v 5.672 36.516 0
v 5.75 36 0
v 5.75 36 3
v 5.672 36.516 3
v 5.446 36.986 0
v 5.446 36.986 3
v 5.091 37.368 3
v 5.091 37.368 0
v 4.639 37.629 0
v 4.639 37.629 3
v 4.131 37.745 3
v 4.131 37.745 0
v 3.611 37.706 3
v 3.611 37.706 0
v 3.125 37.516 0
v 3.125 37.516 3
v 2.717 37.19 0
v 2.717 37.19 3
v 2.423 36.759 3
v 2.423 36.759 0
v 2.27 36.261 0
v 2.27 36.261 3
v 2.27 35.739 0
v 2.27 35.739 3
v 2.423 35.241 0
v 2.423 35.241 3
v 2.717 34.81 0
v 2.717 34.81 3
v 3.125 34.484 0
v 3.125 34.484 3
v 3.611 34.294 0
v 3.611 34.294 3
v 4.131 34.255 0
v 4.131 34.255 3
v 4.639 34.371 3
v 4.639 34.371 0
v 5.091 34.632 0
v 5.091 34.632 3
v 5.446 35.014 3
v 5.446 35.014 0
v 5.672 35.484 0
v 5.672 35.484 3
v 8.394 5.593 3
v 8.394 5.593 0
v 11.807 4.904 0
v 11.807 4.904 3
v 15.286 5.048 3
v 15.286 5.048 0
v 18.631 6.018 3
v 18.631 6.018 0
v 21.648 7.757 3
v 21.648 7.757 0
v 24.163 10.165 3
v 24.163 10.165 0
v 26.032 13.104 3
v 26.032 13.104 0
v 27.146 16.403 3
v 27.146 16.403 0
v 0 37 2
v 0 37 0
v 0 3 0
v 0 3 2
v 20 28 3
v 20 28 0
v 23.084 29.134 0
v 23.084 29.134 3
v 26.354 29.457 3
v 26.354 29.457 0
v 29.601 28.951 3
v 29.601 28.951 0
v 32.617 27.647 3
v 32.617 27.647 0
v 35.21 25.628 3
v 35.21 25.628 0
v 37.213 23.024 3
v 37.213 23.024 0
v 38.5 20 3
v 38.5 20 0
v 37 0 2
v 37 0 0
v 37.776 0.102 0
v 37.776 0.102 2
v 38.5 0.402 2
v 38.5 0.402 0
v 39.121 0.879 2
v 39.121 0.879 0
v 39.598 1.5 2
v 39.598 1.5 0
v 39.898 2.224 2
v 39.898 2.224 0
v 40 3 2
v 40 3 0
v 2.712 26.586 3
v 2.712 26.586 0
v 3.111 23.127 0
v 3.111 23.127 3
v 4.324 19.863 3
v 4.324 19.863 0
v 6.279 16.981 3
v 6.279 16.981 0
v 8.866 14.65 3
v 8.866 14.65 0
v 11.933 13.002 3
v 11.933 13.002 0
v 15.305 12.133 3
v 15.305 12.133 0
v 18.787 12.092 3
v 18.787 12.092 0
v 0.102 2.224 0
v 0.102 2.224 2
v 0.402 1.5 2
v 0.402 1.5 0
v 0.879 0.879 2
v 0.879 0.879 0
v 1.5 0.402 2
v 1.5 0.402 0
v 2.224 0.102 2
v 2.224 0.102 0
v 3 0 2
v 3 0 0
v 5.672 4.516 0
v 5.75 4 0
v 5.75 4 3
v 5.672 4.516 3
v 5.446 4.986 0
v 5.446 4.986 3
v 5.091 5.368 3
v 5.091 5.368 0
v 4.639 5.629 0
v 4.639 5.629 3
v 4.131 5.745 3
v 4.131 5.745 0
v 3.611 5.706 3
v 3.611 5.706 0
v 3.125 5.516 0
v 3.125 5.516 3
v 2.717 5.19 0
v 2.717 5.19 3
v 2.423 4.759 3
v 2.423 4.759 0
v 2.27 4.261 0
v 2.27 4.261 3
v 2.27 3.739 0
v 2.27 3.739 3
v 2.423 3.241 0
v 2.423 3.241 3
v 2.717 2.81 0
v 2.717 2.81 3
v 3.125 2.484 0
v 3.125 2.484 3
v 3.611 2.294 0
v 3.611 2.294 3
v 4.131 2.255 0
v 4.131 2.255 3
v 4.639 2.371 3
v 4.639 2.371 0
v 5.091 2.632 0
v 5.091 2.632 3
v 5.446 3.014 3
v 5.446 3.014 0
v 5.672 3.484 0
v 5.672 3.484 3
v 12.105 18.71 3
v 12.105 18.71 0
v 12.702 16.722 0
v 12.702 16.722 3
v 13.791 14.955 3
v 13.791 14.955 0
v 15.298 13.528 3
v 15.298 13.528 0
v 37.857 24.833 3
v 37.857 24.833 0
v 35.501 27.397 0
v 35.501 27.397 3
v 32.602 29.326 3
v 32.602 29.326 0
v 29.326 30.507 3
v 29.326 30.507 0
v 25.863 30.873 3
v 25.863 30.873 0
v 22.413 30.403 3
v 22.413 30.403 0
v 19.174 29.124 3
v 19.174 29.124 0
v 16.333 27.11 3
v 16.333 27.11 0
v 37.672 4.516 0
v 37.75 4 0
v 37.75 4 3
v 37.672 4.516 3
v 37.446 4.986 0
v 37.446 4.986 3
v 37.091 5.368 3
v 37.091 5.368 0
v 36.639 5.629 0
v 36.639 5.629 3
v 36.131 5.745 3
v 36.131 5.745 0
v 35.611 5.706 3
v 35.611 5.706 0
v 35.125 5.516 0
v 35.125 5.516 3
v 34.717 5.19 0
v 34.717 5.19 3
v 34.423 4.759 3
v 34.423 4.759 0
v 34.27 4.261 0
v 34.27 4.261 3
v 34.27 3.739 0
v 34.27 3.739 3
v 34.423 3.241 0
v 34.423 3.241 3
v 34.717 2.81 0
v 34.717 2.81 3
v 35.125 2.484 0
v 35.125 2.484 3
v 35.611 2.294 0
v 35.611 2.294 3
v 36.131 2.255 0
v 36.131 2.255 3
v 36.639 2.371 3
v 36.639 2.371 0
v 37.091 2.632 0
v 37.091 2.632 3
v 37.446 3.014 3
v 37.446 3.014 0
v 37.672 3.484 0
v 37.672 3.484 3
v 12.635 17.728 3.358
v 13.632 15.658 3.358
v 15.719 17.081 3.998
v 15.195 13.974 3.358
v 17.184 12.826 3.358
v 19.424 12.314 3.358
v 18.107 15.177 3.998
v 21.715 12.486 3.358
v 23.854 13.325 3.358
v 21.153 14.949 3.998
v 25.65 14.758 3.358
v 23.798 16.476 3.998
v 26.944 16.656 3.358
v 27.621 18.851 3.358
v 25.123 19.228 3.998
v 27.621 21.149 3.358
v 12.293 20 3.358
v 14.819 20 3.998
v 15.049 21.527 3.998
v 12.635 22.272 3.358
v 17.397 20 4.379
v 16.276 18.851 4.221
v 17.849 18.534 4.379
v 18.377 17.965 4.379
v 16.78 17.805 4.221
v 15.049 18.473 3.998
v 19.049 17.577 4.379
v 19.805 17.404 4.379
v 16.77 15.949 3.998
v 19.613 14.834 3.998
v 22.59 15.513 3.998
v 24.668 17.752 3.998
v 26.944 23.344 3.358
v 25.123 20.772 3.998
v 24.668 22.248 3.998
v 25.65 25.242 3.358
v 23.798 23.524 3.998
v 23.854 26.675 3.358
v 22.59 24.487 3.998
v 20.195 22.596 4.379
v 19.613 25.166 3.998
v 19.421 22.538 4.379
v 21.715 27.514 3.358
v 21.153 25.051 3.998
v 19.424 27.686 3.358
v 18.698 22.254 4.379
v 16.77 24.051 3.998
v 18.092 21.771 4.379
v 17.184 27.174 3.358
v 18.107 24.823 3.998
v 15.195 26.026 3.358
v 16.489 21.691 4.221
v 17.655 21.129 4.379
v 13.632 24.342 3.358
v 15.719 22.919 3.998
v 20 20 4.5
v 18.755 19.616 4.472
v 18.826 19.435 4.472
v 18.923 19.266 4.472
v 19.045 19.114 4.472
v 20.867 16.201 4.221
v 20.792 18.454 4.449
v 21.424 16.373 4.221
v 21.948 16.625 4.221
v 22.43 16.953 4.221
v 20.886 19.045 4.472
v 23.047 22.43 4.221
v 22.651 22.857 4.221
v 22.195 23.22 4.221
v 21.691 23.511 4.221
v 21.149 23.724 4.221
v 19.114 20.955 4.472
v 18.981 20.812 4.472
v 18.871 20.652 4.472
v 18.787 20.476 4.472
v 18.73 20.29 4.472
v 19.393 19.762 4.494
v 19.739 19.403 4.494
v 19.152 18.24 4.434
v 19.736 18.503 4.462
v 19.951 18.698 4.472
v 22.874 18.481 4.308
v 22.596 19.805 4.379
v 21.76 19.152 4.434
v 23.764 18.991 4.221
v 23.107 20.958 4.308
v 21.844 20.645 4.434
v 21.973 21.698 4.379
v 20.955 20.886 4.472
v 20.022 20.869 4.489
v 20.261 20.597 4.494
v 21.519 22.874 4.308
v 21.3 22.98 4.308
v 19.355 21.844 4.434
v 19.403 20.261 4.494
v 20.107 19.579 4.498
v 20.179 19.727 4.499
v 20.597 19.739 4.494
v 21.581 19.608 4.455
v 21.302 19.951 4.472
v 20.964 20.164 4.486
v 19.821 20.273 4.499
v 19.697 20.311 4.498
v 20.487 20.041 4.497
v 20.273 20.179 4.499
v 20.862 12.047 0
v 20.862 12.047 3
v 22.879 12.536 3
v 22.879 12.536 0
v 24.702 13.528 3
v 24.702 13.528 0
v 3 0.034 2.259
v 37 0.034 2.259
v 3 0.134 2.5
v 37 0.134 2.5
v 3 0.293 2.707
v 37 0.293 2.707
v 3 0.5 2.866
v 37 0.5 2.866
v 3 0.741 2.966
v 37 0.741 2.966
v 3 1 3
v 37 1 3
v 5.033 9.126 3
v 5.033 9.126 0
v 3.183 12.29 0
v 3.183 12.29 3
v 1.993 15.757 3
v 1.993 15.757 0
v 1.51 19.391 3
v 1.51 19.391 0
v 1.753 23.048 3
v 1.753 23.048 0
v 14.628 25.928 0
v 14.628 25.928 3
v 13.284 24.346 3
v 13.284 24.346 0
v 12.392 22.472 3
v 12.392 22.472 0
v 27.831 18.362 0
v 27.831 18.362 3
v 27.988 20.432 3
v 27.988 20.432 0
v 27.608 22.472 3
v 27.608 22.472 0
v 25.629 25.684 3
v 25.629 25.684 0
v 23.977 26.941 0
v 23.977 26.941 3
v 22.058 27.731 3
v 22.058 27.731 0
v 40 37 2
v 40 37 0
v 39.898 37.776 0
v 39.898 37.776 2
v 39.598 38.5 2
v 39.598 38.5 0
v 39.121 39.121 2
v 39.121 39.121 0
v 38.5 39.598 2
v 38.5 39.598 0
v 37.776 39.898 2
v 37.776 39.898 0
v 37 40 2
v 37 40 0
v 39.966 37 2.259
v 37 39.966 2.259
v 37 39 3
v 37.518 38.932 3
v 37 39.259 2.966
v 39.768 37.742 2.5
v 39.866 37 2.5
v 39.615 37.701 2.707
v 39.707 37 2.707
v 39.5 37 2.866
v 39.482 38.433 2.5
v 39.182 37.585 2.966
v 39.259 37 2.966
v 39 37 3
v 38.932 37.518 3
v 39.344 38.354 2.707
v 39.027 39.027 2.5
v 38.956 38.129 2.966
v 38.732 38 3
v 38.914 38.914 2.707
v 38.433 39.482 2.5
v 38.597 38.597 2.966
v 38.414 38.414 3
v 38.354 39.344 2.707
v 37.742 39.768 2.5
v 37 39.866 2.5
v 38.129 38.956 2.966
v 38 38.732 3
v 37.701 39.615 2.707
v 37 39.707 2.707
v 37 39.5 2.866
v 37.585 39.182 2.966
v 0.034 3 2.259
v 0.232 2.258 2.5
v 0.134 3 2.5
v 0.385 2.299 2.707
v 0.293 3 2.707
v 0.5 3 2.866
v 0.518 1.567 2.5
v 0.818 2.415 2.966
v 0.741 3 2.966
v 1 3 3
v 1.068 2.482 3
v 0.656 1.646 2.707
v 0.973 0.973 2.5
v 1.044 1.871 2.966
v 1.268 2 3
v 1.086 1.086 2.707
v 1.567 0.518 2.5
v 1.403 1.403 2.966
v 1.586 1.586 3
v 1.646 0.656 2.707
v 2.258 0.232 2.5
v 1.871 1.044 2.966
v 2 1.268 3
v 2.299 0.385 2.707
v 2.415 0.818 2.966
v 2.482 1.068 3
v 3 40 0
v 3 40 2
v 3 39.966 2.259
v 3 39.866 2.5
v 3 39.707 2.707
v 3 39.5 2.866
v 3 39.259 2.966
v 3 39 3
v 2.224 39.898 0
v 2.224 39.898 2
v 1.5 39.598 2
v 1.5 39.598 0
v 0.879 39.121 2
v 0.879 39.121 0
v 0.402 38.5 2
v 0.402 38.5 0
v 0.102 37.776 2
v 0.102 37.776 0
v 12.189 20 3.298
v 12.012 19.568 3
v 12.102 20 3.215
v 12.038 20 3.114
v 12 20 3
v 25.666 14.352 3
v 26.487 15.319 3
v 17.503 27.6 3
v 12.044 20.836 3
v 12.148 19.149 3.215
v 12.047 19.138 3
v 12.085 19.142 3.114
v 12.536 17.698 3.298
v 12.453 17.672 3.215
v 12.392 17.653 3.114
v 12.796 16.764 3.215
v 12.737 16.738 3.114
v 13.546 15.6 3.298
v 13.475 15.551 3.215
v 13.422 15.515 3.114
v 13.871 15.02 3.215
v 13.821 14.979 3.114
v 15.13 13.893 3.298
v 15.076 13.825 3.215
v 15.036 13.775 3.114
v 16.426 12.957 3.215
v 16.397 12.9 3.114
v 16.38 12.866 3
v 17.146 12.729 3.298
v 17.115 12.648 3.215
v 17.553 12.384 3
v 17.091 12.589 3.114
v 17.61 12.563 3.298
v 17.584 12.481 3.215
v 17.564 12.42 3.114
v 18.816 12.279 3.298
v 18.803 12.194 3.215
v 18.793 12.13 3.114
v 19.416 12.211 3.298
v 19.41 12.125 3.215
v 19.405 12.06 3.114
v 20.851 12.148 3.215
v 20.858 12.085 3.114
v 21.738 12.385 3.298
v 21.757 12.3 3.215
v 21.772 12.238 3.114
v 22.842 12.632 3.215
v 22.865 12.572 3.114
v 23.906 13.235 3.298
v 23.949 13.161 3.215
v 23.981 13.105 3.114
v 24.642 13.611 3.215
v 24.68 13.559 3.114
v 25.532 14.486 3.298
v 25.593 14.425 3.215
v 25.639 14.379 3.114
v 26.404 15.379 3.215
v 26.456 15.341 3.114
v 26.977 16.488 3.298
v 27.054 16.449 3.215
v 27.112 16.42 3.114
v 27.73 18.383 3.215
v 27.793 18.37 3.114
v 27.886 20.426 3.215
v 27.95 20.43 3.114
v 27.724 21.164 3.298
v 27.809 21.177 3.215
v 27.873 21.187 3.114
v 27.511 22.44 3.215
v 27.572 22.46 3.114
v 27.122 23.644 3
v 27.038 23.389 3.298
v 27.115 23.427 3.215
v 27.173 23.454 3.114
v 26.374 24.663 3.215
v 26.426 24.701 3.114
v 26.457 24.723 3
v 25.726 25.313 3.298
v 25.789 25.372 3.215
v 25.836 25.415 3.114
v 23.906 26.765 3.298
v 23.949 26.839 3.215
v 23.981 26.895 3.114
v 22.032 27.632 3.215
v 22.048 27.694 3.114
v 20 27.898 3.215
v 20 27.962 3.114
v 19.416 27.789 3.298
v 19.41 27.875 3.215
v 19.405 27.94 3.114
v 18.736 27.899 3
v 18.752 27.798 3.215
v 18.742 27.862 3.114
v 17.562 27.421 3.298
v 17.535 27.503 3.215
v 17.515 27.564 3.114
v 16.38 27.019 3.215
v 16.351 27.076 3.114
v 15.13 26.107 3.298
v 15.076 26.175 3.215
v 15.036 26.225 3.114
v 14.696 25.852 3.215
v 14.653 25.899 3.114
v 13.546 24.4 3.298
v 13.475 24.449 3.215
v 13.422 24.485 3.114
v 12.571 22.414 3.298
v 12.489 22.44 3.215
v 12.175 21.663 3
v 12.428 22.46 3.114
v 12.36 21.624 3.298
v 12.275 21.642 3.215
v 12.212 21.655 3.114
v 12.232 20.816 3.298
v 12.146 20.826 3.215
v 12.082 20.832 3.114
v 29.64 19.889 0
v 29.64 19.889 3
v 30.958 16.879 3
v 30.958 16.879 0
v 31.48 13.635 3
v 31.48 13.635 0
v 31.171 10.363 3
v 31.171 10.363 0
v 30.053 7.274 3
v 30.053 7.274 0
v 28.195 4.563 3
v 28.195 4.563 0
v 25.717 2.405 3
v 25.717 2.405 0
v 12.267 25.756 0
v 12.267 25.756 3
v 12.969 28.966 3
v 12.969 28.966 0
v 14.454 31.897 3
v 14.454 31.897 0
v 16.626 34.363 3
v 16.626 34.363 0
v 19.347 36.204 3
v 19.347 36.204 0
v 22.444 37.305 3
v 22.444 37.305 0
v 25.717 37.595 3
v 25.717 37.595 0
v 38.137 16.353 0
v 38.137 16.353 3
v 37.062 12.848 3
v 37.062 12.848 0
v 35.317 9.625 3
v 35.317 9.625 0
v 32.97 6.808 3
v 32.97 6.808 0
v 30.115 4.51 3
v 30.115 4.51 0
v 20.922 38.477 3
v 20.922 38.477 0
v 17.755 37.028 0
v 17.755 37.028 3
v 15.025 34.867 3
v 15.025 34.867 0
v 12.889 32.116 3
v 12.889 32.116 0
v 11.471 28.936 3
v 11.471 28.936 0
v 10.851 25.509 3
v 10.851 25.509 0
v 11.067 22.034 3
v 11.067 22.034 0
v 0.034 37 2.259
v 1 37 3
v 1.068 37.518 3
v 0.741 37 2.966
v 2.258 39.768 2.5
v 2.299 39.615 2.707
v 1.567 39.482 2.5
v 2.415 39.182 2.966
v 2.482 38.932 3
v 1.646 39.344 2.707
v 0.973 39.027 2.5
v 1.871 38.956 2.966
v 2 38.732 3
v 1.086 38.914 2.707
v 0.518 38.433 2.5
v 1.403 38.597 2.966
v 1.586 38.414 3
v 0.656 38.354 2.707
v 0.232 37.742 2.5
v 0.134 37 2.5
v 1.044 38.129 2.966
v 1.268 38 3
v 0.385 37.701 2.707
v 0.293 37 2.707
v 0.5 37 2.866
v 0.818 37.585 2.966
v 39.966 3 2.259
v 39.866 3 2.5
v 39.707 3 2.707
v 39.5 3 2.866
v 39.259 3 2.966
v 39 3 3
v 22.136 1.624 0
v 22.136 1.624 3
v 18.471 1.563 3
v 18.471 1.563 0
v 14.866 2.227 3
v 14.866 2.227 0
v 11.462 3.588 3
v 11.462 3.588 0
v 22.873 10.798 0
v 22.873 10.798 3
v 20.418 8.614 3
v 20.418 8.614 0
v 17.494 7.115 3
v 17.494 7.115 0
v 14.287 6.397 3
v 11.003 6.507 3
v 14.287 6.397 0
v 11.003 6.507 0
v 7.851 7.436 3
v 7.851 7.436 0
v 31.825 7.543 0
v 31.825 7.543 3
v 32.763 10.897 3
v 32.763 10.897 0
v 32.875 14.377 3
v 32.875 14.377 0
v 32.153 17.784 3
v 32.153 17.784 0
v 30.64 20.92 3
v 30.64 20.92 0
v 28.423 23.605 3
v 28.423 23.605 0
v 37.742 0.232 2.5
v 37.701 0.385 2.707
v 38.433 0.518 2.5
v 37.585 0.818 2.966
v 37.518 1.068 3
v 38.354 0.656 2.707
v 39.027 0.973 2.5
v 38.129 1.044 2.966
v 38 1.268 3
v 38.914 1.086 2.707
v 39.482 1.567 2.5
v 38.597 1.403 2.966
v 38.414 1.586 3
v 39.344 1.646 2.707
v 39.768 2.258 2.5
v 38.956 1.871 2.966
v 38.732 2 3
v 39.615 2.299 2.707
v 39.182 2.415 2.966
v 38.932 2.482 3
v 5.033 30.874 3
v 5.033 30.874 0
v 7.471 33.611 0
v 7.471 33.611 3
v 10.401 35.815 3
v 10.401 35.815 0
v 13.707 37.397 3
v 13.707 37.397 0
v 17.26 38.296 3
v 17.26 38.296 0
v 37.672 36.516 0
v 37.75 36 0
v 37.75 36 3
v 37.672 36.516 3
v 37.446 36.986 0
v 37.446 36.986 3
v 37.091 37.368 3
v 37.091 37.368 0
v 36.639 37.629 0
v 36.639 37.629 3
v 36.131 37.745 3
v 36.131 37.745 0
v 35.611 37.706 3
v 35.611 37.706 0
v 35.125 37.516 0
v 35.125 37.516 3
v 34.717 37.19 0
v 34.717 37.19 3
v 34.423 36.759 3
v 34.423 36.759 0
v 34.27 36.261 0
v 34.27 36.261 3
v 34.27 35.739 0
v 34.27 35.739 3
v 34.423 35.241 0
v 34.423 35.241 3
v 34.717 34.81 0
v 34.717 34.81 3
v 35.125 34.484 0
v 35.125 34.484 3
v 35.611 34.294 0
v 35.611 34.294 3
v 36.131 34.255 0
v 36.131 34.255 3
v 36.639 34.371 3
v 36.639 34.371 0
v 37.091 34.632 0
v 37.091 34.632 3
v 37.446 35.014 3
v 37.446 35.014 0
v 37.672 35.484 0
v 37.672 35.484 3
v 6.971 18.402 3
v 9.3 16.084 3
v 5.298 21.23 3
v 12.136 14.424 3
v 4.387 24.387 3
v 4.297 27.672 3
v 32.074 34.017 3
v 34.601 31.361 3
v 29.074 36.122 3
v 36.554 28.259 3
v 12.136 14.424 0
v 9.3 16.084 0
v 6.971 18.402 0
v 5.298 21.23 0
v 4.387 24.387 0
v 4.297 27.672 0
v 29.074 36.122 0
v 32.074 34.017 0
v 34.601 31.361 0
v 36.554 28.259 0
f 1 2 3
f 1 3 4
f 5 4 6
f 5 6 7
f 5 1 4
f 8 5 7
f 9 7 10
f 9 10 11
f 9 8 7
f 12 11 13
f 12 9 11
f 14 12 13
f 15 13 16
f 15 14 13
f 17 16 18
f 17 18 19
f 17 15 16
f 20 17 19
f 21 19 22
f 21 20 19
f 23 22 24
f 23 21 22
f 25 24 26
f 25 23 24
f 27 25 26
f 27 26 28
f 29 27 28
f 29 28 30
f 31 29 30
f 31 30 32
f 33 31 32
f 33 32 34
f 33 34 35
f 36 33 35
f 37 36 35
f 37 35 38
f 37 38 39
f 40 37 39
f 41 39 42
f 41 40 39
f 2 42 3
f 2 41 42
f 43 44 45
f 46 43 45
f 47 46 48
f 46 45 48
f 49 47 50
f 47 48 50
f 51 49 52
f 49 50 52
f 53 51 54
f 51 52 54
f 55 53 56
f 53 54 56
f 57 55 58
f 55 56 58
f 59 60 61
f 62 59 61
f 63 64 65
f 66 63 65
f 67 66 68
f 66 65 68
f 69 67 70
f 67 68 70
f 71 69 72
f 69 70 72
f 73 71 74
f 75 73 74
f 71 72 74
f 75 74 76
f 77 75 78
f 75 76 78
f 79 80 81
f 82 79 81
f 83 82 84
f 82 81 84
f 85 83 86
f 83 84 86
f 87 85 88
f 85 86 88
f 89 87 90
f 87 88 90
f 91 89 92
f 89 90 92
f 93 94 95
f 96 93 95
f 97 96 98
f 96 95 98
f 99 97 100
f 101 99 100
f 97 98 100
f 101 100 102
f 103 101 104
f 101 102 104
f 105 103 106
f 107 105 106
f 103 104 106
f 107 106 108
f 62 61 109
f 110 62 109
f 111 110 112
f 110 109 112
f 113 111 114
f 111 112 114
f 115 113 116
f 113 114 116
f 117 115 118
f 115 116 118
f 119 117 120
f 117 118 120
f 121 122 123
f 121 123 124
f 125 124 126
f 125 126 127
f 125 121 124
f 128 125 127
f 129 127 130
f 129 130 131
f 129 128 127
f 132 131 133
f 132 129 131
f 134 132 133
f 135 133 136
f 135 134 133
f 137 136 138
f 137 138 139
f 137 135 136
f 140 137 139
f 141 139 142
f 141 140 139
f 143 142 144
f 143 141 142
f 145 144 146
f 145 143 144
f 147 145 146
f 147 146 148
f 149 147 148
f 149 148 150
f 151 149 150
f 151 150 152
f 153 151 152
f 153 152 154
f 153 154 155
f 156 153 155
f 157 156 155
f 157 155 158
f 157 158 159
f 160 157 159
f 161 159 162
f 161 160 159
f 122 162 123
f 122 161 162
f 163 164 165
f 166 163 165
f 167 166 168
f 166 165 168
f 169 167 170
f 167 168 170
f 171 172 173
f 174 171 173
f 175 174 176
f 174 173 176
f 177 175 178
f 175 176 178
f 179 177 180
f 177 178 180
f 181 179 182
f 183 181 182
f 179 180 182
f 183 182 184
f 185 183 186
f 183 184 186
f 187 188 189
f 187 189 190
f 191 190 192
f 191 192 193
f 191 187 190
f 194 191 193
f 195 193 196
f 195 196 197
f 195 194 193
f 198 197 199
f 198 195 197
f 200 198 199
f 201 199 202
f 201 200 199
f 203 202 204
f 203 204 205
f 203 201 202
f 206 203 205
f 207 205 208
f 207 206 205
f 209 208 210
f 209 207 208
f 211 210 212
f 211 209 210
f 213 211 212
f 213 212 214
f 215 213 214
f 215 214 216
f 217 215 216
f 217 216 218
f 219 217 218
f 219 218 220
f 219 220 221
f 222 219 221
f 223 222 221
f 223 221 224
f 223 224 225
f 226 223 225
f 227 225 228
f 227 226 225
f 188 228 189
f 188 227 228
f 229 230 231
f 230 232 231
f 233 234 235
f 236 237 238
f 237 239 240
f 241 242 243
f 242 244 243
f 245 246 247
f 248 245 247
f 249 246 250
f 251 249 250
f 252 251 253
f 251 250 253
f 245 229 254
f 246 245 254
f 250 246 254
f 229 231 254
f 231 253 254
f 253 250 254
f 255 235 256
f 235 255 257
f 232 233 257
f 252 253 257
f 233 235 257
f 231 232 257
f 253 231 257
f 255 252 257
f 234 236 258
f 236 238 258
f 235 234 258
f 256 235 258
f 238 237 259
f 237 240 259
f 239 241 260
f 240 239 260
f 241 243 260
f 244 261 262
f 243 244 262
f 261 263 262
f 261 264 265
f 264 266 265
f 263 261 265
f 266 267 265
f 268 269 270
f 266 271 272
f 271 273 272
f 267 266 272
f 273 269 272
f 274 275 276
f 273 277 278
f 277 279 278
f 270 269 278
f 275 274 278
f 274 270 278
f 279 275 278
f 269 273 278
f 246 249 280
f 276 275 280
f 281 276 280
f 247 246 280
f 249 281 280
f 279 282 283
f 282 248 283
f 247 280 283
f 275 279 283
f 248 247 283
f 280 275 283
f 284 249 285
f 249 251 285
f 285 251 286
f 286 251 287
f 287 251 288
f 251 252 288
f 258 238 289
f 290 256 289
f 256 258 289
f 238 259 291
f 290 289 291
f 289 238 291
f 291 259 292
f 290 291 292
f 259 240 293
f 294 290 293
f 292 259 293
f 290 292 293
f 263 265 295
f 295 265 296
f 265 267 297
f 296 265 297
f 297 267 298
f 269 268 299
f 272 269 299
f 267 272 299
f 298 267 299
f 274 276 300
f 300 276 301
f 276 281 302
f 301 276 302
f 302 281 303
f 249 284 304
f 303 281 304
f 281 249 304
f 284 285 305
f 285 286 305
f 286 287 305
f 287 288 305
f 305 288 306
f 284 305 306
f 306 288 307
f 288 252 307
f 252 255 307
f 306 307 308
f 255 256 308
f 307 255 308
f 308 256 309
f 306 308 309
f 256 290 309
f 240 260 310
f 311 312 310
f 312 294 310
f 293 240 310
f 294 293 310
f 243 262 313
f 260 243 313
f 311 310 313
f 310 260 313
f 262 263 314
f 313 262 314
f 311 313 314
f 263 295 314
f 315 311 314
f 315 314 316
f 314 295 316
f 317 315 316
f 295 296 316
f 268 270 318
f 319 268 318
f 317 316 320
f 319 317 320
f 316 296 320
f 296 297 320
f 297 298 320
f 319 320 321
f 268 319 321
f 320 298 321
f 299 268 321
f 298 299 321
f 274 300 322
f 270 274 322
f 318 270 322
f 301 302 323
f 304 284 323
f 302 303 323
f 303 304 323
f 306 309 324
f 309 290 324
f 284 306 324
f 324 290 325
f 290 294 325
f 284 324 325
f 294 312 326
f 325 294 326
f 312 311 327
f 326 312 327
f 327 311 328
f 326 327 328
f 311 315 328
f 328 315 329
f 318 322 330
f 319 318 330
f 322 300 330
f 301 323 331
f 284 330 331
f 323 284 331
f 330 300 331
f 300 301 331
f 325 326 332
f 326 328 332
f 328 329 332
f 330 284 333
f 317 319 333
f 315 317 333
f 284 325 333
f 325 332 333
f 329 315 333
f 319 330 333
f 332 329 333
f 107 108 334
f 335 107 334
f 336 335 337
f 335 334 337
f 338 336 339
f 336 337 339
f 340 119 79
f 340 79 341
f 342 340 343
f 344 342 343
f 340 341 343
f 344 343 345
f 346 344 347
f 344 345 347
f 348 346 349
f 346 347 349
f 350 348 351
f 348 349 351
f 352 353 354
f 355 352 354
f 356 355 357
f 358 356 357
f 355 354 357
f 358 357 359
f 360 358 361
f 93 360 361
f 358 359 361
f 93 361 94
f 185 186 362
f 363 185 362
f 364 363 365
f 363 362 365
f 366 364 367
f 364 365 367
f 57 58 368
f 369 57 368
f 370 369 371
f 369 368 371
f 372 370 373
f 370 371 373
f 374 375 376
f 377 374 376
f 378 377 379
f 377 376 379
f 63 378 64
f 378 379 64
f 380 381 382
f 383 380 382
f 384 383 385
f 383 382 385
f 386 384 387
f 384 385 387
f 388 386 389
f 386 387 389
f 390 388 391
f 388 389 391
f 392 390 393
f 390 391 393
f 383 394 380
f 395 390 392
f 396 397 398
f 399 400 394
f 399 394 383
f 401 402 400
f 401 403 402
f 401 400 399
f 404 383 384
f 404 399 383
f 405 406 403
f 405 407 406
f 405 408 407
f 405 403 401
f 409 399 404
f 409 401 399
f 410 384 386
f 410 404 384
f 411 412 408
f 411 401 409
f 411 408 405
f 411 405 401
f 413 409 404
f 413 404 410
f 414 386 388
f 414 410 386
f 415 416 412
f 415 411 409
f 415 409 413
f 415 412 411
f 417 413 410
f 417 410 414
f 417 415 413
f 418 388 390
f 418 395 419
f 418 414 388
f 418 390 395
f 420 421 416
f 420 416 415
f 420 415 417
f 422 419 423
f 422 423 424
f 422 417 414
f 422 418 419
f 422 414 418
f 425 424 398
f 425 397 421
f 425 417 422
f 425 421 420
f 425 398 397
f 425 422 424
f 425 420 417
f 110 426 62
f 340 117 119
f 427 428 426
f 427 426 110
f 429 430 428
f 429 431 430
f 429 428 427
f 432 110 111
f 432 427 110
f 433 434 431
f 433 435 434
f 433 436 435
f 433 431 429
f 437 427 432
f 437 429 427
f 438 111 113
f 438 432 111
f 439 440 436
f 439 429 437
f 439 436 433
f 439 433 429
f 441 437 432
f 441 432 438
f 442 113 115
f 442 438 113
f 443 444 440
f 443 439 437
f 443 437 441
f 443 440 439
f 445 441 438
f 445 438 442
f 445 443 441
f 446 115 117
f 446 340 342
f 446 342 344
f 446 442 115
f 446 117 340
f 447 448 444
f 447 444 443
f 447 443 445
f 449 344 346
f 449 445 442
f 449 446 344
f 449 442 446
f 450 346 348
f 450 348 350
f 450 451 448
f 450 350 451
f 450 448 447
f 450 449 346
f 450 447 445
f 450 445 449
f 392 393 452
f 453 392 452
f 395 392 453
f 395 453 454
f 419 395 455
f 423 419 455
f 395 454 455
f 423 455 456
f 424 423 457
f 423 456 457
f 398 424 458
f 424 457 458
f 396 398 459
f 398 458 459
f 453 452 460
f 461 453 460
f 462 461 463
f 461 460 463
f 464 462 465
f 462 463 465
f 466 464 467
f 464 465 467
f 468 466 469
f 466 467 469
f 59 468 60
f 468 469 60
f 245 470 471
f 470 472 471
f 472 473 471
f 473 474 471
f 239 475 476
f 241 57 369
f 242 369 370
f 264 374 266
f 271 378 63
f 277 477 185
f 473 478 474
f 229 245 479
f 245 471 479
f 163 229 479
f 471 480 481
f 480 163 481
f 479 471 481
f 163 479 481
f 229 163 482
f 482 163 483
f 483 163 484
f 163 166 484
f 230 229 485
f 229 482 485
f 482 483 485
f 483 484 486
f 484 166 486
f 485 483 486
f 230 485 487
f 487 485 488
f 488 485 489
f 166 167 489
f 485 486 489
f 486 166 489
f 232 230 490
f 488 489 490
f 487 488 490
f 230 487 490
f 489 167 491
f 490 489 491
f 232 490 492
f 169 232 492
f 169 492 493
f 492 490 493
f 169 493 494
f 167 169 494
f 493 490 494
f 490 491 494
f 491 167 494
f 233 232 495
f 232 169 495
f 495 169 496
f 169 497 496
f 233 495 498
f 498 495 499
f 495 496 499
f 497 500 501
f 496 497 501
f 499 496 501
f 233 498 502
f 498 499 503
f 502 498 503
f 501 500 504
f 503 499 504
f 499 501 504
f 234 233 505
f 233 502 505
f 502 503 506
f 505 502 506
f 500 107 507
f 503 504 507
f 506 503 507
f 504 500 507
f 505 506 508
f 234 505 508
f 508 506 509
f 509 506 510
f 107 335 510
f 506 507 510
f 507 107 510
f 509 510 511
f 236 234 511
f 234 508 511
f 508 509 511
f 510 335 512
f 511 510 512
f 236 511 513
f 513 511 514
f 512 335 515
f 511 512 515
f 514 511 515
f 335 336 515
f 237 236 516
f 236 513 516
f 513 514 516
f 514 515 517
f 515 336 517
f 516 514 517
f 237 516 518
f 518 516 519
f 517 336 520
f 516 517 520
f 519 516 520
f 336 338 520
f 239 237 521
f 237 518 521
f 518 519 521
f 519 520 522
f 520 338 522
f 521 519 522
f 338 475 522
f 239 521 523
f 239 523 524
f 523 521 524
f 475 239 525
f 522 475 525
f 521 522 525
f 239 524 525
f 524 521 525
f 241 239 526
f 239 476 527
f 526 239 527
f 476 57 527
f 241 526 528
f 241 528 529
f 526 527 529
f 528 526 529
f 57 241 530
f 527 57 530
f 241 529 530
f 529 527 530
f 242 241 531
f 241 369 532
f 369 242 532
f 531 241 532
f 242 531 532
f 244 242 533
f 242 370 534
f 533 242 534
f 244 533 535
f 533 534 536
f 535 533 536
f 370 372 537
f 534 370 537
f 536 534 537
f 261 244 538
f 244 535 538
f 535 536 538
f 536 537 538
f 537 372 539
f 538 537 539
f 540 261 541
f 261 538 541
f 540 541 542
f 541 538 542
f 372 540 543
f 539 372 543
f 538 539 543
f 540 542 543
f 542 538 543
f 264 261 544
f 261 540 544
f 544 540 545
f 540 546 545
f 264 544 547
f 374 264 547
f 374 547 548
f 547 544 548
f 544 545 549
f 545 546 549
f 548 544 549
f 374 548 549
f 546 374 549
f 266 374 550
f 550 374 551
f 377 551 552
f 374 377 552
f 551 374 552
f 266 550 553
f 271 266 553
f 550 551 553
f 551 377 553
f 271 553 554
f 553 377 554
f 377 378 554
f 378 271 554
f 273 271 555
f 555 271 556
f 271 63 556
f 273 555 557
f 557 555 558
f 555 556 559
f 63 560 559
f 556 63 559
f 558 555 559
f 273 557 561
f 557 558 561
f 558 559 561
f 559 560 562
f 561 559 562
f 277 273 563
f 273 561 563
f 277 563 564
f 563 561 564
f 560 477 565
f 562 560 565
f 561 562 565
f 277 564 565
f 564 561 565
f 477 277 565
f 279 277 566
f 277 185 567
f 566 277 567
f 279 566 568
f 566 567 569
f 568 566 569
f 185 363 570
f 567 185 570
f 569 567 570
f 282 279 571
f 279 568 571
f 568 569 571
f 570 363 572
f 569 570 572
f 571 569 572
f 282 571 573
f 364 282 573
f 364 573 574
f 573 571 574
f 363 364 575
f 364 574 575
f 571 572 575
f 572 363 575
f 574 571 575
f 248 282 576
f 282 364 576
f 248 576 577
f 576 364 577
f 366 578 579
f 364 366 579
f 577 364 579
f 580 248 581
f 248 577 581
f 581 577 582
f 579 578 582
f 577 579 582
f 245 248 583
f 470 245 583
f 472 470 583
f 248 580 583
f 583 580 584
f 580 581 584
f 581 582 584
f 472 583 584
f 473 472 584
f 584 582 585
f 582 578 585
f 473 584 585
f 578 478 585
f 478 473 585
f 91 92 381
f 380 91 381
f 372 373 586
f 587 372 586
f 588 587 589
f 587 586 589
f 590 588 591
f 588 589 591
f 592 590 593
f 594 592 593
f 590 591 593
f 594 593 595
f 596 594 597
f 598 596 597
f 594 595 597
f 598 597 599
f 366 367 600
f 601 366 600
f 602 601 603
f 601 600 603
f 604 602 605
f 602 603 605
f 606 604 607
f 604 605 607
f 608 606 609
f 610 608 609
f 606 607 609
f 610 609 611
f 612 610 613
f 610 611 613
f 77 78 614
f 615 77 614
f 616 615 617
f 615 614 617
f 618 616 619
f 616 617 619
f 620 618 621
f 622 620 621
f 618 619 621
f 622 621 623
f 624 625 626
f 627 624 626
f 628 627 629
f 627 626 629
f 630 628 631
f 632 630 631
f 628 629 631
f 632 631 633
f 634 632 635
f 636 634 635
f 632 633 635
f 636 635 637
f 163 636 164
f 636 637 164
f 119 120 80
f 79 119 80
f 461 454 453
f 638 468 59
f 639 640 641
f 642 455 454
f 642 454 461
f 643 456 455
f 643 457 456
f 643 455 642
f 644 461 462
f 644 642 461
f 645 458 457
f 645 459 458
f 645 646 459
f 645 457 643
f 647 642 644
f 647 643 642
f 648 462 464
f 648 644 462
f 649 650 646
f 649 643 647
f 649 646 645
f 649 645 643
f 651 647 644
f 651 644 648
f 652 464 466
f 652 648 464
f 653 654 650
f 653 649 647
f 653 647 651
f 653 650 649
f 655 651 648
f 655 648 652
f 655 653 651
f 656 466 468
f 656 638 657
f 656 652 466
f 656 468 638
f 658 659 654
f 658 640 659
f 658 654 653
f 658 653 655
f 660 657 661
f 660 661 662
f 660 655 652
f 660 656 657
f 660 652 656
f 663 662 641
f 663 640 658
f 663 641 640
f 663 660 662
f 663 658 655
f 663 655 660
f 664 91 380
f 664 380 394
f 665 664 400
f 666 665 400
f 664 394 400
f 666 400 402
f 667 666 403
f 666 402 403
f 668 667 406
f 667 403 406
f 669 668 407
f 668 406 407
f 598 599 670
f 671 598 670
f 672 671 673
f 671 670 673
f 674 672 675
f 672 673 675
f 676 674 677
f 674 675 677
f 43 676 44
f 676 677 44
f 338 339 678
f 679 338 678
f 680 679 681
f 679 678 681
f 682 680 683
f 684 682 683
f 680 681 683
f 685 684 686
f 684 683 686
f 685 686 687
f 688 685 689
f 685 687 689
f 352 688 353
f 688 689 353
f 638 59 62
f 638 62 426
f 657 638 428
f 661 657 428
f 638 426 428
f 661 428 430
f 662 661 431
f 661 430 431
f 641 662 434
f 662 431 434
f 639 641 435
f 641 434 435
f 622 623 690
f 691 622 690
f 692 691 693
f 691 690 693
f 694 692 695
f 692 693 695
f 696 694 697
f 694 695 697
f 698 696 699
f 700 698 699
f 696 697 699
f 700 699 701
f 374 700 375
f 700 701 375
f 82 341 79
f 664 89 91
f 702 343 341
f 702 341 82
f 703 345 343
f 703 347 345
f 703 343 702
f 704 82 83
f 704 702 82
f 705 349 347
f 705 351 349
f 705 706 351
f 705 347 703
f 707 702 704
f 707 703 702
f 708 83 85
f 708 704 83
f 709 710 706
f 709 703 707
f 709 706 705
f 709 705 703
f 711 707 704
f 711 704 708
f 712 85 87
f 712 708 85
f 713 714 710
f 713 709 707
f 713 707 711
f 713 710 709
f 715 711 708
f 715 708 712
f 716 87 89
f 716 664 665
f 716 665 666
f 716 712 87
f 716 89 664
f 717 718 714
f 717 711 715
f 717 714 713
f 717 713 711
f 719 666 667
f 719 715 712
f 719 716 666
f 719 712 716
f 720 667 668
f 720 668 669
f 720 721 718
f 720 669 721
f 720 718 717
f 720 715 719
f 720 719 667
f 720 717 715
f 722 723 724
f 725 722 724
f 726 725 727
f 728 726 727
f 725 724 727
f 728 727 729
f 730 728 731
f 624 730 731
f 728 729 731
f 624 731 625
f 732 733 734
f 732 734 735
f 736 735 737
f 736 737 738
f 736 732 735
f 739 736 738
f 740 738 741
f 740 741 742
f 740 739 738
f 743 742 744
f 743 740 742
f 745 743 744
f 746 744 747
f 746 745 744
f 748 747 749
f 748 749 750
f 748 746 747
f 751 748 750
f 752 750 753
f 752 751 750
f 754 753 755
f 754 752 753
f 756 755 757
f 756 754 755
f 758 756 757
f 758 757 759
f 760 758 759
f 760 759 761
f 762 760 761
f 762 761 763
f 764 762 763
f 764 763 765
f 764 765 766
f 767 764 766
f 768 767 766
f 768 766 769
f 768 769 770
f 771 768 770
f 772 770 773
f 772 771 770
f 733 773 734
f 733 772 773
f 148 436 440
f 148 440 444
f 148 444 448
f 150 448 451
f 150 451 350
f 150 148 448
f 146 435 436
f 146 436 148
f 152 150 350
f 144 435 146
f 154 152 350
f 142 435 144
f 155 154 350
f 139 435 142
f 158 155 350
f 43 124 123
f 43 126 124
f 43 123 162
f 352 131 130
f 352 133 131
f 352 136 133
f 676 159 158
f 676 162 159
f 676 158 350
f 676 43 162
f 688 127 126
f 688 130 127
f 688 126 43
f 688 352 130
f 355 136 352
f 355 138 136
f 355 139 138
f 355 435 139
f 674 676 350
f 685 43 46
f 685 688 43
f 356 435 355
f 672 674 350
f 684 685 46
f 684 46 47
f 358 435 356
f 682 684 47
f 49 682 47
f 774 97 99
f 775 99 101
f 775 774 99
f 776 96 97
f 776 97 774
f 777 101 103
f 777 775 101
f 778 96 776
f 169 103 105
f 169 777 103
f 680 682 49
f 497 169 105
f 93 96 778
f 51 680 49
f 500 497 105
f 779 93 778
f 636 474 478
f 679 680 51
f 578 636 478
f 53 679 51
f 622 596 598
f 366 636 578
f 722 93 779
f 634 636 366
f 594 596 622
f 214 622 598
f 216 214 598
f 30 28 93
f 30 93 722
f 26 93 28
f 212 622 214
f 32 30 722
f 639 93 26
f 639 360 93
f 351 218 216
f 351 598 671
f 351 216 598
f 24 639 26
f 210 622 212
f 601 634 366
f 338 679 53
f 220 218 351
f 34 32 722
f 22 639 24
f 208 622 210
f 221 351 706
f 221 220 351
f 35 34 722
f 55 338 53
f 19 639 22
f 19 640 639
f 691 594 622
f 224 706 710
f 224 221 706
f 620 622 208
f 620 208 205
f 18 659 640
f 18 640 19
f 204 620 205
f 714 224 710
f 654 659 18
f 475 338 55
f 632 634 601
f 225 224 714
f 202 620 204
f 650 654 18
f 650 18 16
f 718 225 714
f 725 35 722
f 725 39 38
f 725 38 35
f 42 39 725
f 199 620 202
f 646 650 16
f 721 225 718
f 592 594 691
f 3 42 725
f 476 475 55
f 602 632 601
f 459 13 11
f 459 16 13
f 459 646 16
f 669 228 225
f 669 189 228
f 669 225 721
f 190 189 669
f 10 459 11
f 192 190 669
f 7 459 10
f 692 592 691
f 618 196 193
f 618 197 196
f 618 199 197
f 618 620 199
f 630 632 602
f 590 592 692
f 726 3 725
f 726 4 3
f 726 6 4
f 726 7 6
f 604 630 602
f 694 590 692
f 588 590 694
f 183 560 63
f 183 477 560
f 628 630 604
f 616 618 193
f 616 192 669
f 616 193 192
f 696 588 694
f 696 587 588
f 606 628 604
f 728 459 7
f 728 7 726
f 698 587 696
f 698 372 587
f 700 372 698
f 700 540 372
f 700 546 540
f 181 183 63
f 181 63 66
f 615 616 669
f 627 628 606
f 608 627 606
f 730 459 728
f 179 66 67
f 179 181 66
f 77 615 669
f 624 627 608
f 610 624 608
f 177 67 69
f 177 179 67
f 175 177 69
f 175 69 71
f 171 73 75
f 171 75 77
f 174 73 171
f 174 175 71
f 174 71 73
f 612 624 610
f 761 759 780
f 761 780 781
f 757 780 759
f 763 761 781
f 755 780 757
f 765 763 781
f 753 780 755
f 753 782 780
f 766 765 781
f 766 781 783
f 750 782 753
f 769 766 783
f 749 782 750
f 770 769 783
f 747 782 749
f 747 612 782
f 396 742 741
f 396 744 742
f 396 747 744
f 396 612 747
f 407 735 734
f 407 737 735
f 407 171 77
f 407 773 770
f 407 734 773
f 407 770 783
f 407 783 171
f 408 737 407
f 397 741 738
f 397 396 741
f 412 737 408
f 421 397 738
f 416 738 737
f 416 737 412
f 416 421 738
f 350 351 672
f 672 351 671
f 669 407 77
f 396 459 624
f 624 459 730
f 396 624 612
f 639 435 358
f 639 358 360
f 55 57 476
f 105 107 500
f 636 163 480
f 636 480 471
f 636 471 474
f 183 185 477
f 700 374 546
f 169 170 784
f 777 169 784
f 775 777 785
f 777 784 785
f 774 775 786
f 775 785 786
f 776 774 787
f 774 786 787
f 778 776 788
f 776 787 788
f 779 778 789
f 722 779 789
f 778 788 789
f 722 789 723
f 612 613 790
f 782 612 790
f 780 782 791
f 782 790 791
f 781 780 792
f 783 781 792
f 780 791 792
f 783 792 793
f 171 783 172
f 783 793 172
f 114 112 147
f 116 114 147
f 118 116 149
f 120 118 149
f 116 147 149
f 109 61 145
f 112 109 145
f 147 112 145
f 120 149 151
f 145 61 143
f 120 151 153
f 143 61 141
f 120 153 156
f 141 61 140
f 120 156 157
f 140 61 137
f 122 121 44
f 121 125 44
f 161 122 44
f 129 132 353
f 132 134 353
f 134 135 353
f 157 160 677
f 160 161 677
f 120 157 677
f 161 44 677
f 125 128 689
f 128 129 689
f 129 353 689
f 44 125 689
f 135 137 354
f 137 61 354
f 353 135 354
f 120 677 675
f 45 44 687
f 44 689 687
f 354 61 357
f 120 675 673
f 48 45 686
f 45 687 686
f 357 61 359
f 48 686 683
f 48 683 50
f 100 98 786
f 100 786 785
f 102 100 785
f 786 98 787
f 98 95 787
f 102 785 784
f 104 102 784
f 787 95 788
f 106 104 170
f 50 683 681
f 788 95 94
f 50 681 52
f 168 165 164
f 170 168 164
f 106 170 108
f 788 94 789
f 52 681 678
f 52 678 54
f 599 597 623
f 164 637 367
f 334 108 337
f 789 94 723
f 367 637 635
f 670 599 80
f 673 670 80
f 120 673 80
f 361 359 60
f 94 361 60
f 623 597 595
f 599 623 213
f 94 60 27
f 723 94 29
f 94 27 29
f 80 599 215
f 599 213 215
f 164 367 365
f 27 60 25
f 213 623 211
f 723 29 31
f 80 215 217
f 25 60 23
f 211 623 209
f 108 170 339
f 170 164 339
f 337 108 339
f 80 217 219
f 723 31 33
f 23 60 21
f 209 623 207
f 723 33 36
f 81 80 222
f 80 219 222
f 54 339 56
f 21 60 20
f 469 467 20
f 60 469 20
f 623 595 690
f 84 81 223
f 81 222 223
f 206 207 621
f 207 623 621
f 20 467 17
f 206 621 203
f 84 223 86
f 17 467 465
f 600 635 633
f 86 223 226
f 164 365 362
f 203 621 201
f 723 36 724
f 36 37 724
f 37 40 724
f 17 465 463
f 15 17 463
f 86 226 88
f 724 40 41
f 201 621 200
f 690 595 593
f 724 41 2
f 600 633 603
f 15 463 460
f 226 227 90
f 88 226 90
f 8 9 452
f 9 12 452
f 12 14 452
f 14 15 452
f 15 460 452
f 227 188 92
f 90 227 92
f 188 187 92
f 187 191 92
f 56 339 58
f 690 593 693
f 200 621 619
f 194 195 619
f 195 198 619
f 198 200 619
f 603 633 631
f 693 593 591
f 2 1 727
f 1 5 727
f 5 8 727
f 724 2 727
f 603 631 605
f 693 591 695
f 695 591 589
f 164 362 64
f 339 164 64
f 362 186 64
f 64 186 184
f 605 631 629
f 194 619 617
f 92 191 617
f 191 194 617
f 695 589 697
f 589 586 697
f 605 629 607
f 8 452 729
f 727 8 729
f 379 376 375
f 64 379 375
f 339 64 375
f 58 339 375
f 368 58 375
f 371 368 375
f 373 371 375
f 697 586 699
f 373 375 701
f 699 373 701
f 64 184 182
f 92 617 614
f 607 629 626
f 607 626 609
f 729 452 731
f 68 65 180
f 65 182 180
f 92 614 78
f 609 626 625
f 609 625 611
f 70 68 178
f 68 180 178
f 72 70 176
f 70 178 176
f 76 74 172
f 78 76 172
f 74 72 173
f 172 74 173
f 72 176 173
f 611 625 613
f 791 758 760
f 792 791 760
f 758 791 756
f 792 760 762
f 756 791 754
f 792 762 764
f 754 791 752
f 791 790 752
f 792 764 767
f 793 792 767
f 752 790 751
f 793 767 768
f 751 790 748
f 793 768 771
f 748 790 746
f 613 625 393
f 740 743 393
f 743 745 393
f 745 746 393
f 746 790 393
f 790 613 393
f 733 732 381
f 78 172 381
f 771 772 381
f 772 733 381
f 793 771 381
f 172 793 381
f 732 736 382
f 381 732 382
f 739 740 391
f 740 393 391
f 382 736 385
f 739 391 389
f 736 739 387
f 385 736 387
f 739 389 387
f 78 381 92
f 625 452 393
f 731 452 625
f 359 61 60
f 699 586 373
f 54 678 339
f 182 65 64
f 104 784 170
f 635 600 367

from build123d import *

# Parameters (mm, degrees)
F0_R     = 1.75
F1_DEPTH = 3
F2_R     = 1


with BuildPart() as f1:
    # F0 (on Top) → F1 (new body)
    with BuildSketch(Plane.XY):
        with BuildLine():
            ThreePointArc((0, 3), (0.8786796564, 0.8786796564), (3, 0))
            Line((3, 0), (37, 0))
            ThreePointArc((37, 0), (39.1213203436, 0.8786796564), (40, 3))
            Line((40, 3), (40, 37))
            ThreePointArc((40, 37), (39.1213203436, 39.1213203436), (37, 40))
            Line((37, 40), (3, 40))
            ThreePointArc((3, 40), (0.8786796564, 39.1213203436), (0, 37))
            Line((0, 37), (0, 3))
        make_face()
        with Locations((4, 4)):
            Circle(F0_R, mode=Mode.SUBTRACT)
        with BuildLine():
            ThreePointArc((25.7168143959, 2.4054544485), (16.6516253204, 1.8055396616), (8.3939355728, 5.5934296756))
            ThreePointArc((8.3939355728, 5.5934296756), (20.1917154021, 6.7967188392), (27.1456707418, 16.4028636876))
            ThreePointArc((27.1456707418, 16.4028636876), (27.9768447331, 19.3917664063), (27.6084521304, 22.472135955))
            ThreePointArc((27.6084521304, 22.472135955), (31.4294663136, 11.9894373312), (25.7168143959, 2.4054544485))
        make_face(mode=Mode.SUBTRACT)
        with BuildLine():
            ThreePointArc((5.0331856041, 9.1259728326), (1.6613352552, 17.56209611), (2.7120662697, 26.5861481412))
            ThreePointArc((2.7120662697, 26.5861481412), (7.5021767329, 15.7376295574), (18.7870537655, 12.0924870261))
            ThreePointArc((18.7870537655, 12.0924870261), (21.8865160613, 12.2256153201), (24.7022820183, 13.527864045))
            ThreePointArc((24.7022820183, 13.527864045), (15.9134015021, 6.6545315855), (5.0331856041, 9.1259728326))
        make_face(mode=Mode.SUBTRACT)
        with Locations((36, 4)):
            Circle(F0_R, mode=Mode.SUBTRACT)
        with BuildLine():
            ThreePointArc((20, 28), (31.1503971529, 28.3946684161), (38.5, 20))
            ThreePointArc((38.5, 20), (36.2692553858, 11.1931089939), (30.1149914386, 4.5101017371))
            ThreePointArc((30.1149914386, 4.5101017371), (32.6163099018, 16.1022939223), (25.6292136254, 25.6843604706))
            ThreePointArc((25.6292136254, 25.6843604706), (23.0434451067, 27.3984756459), (20, 28))
        make_face(mode=Mode.SUBTRACT)
        with BuildLine():
            ThreePointArc((5.0331856041, 30.8740271674), (12.014456559, 36.687752873), (20.9215337867, 38.4770337306))
            ThreePointArc((20.9215337867, 38.4770337306), (12.0842050334, 30.5689913546), (12.1046872588, 18.7100245281))
            ThreePointArc((12.1046872588, 18.7100245281), (13.1890863131, 15.8033996199), (15.2977179817, 13.527864045))
            ThreePointArc((15.2977179817, 13.527864045), (6.0448769164, 19.7626095929), (5.0331856041, 30.8740271674))
        make_face(mode=Mode.SUBTRACT)
        with Locations((4, 36)):
            Circle(F0_R, mode=Mode.SUBTRACT)
        with BuildLine():
            ThreePointArc((25.7168143959, 37.5945455515), (33.4033274796, 32.7515023614), (37.8574729322, 24.8332867156))
            ThreePointArc((37.8574729322, 24.8332867156), (27.6055929298, 30.7943663266), (16.3333746086, 27.1102642876))
            ThreePointArc((16.3333746086, 27.1102642876), (13.9041077858, 25.1807430078), (12.3915478696, 22.472135955))
            ThreePointArc((12.3915478696, 22.472135955), (15.461858115, 33.1987530743), (25.7168143959, 37.5945455515))
        make_face(mode=Mode.SUBTRACT)
        with Locations((36, 36)):
            Circle(F0_R, mode=Mode.SUBTRACT)
    extrude(amount=F1_DEPTH)

    # F2
    f2_edges = [f1.edges().sort_by_distance(p)[0] for p in [
        (20, 0, 3),
    ]]
    fillet(f2_edges, radius=F2_R)

    # F4 (on offset) → F5 (revolve)
    with BuildSketch(Plane.XZ.offset(-20)):
        with BuildLine():
            Line((12, 3), (20, 3))
            Line((20, 3), (20, 4.5))
            ThreePointArc((20, 4.5), (16.1031638738, 4.2209285699), (12.292759493, 3.358356189))
            ThreePointArc((12.292759493, 3.358356189), (12.1024290926, 3.2150836308), (12, 3))
        make_face()
    revolve(axis=Axis((20, 20, 2.25), (0, 0, 1)))


solid = f1.part
